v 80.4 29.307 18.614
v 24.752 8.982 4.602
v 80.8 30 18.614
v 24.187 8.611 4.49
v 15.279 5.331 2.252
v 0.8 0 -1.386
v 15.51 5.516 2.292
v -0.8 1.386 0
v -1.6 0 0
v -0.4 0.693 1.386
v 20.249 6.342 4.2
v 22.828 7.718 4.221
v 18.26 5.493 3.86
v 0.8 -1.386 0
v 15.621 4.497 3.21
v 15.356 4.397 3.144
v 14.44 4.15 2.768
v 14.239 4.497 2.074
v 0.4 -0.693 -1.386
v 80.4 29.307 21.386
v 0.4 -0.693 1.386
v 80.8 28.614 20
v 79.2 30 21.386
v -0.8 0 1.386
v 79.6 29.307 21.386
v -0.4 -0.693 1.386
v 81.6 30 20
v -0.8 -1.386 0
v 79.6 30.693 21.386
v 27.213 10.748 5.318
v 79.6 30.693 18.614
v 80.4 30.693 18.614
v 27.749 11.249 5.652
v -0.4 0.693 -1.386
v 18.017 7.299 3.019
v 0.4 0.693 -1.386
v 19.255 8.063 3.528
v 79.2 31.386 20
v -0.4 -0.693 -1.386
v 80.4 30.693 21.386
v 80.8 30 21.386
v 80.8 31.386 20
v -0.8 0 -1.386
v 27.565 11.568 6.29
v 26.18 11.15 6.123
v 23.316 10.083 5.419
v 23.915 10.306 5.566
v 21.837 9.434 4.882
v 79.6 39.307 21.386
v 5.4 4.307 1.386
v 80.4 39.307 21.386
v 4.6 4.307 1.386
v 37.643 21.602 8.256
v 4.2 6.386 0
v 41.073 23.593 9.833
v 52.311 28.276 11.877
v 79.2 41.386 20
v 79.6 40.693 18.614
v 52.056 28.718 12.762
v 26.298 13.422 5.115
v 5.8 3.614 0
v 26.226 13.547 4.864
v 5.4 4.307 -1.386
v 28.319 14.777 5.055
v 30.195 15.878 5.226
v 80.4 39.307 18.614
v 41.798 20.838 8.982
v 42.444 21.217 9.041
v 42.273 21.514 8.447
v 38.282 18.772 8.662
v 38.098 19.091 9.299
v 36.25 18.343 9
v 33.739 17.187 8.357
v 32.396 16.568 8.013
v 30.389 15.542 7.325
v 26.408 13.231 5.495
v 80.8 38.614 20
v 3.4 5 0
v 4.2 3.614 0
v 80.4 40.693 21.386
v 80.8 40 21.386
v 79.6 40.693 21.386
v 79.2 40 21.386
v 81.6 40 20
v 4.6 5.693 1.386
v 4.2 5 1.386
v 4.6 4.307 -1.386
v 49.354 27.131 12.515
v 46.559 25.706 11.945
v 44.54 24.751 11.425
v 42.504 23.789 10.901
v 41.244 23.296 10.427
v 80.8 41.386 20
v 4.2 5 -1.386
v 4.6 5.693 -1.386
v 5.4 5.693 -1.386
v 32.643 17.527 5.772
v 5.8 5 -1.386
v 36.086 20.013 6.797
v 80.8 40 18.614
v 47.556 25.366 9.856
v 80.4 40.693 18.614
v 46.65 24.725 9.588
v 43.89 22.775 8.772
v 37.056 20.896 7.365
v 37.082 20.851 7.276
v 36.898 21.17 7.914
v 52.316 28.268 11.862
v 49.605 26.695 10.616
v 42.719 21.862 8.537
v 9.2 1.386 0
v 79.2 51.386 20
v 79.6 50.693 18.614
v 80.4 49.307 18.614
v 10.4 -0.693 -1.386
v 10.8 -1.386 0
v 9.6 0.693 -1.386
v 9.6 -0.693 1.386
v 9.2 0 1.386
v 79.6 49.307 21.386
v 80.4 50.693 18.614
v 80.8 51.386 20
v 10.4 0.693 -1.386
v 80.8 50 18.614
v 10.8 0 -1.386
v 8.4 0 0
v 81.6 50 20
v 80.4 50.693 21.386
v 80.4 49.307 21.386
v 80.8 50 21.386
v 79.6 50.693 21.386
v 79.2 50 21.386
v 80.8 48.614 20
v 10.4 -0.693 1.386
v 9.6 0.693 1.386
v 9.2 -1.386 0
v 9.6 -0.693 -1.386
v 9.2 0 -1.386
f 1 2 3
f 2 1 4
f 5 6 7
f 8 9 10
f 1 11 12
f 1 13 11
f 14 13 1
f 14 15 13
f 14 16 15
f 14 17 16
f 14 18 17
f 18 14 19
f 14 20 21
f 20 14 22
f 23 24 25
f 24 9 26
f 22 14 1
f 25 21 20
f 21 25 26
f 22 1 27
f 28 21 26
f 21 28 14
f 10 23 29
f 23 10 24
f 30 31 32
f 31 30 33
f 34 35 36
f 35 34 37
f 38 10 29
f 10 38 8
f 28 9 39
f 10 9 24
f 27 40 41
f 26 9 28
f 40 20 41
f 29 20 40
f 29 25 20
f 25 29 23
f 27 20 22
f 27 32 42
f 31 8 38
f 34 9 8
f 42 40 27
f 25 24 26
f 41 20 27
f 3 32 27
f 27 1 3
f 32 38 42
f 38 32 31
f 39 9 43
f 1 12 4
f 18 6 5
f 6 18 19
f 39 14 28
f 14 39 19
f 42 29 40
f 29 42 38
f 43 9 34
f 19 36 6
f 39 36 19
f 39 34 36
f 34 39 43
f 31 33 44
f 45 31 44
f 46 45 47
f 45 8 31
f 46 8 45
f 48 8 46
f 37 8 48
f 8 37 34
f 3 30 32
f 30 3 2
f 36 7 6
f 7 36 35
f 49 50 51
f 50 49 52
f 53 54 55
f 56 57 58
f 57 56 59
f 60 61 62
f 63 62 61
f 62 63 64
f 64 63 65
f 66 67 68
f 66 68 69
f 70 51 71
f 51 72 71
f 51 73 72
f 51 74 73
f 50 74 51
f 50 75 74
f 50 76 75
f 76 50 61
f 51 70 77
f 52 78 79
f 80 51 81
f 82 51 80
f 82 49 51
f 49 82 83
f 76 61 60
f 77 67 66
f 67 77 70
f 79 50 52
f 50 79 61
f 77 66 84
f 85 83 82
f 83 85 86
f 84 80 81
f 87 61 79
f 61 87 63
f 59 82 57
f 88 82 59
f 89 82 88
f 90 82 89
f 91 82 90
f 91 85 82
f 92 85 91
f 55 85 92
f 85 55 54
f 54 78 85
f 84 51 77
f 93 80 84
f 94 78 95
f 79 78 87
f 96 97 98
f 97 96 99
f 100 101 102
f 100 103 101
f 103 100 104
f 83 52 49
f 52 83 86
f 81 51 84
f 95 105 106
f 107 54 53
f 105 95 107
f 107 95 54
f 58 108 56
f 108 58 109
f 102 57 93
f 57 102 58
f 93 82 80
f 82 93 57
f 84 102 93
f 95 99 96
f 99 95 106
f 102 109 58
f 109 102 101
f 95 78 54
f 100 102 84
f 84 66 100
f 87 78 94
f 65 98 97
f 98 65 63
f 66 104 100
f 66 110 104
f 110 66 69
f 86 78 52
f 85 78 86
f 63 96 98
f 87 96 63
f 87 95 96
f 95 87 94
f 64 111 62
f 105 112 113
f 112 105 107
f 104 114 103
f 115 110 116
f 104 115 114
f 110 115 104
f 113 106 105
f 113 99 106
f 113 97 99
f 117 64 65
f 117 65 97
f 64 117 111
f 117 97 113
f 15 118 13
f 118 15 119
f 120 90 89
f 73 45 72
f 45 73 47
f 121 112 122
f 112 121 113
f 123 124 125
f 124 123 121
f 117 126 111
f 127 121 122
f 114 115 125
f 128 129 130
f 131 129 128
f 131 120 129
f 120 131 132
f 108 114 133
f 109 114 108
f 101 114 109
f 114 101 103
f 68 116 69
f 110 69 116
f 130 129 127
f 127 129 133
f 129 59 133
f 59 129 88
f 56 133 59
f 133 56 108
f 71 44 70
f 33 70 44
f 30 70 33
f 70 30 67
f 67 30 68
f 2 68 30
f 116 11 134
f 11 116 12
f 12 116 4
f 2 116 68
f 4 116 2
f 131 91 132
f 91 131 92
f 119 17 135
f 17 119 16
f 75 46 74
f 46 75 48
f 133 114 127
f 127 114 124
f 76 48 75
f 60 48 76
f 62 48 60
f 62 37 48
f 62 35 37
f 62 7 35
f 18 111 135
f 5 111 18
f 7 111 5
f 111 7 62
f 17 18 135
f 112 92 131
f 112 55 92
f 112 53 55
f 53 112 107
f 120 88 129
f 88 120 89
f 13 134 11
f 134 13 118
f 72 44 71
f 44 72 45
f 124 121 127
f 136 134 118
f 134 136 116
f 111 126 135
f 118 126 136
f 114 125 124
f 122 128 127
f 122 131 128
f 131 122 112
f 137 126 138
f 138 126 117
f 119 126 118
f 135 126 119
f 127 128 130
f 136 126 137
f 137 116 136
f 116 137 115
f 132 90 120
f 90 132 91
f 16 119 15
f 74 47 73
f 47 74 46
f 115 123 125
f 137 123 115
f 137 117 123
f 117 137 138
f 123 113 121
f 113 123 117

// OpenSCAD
module cable(a,b,r=1.6){hull(){translate(a)sphere(r);translate(b)sphere(r);}} cable([0,0,0],[80,30,20]);cable([5,5,0],[80,40,20]);cable([10,0,0],[80,50,20]);
